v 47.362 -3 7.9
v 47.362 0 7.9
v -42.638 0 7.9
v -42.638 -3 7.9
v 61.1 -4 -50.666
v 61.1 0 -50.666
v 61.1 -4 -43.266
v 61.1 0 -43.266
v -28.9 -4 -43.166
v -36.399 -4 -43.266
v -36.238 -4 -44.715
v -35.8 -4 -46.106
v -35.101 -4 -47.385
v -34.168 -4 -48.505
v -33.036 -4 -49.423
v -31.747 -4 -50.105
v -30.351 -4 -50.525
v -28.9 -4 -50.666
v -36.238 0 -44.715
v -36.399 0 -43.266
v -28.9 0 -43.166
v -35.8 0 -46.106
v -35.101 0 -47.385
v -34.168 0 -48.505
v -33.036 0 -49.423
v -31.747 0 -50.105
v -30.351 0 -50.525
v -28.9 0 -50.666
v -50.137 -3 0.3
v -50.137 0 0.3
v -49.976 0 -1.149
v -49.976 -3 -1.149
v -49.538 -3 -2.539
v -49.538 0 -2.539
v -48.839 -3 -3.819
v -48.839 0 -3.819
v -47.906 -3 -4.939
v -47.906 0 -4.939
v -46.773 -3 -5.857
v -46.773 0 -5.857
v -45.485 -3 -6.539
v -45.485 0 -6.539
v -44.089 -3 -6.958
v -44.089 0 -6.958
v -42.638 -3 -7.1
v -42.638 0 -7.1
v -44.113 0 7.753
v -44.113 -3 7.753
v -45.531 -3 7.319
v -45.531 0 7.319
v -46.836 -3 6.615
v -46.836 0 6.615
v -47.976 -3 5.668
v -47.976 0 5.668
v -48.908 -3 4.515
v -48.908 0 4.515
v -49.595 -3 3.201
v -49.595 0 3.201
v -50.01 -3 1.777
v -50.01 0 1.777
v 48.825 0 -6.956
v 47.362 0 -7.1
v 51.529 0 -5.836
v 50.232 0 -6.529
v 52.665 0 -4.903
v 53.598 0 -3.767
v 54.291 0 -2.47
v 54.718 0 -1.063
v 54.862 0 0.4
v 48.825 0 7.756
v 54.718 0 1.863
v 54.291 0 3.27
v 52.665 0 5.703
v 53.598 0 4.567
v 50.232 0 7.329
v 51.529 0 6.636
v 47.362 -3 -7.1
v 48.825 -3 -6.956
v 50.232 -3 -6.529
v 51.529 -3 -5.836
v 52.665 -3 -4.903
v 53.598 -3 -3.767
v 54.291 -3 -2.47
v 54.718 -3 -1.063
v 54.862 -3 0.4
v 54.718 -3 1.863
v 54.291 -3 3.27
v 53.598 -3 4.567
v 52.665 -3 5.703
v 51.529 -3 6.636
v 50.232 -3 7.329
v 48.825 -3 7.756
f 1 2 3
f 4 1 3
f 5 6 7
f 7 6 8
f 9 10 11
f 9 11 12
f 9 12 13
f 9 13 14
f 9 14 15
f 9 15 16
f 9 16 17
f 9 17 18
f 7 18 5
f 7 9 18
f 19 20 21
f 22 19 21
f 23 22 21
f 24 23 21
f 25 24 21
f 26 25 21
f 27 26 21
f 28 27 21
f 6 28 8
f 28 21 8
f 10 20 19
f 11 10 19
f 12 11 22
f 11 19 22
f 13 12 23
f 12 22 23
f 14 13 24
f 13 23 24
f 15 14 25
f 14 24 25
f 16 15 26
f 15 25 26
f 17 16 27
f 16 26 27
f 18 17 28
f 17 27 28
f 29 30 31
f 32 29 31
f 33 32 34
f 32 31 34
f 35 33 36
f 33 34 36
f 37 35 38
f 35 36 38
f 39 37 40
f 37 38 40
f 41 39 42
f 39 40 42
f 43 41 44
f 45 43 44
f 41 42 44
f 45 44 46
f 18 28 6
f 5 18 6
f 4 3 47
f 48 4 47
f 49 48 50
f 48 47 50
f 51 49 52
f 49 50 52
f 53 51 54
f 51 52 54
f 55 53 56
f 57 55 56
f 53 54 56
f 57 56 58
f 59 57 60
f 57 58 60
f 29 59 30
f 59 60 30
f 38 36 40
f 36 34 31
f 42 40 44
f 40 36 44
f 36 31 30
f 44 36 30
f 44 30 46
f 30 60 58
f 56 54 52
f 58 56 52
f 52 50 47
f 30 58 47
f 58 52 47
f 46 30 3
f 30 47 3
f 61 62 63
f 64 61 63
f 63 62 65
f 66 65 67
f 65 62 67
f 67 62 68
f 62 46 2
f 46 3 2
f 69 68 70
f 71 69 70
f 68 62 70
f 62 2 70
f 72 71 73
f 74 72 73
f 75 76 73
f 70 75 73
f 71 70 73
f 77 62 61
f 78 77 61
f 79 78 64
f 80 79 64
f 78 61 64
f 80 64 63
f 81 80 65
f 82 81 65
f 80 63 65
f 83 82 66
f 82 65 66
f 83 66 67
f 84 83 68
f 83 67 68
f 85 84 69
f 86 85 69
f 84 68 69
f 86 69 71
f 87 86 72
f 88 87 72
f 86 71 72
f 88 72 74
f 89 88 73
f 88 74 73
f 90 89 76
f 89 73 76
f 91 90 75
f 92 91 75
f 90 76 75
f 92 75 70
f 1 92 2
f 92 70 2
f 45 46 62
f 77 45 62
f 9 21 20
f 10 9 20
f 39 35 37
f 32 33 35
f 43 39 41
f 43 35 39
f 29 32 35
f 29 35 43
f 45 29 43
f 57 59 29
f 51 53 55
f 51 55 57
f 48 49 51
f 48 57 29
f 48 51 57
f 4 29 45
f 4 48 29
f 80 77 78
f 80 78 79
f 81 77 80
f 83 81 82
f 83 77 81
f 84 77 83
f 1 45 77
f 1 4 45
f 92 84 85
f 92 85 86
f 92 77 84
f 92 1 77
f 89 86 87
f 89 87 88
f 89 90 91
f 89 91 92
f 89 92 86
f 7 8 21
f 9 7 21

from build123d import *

# Parameters (mm, degrees)
F1_DEPTH = 4
F2_DEPTH = 3


with BuildPart() as f1:
    # F0 (on Front) → F1 (new body)
    with BuildSketch(Plane.XZ):
        Polygon((-28.899978, -43.166491), (-28.899978, -50.666491), (61.100022, -50.666491), (61.100022, -43.266491), align=None)
        with BuildLine():
            ThreePointArc((-36.399311, -43.266491), (-34.167805, -48.505031), (-28.899978, -50.666491))
            Line((-28.899978, -50.666491), (-28.899978, -43.166491))
            Line((-28.899978, -43.166491), (-36.399311, -43.266491))
        make_face()
    extrude(amount=F1_DEPTH)


with BuildPart() as f2:
    # F0 (on Front) → F2 (new body)
    with BuildSketch(Plane.XZ):
        with BuildLine():
            ThreePointArc((-50.137134, 0.3), (-47.905628, -4.938539), (-42.637801, -7.1))
            Line((-42.637801, -7.1), (-42.637801, 0.3))
            Line((-42.637801, 0.3), (-50.137134, 0.3))
        make_face()
        with BuildLine():
            Line((-50.137134, 0.3), (-42.637801, 0.3))
            Line((-42.637801, 0.3), (-42.637801, 7.9))
            ThreePointArc((-42.637801, 7.9), (-47.97634, 5.667827), (-50.137134, 0.3))
        make_face()
        with BuildLine():
            Line((47.362199, -1.1), (47.362199, -7.1))
            ThreePointArc((47.362199, -7.1), (54.862199, 0.4), (47.362199, 7.9))
            Line((47.362199, 7.9), (47.362199, 1.9))
            ThreePointArc((47.362199, 1.9), (48.422859, 1.46066), (48.862199, 0.4))
            ThreePointArc((48.862199, 0.4), (48.422859, -0.66066), (47.362199, -1.1))
        make_face()
        with BuildLine():
            Line((-42.637801, 0.3), (-42.637801, -7.1))
            Line((-42.637801, -7.1), (47.362199, -7.1))
            Line((47.362199, -7.1), (47.362199, -1.1))
            ThreePointArc((47.362199, -1.1), (46.337504, -0.695445), (45.865536, 0.3))
            Line((45.865536, 0.3), (-31.948796, 0.3))
            Line((-31.948796, 0.3), (-42.637801, 0.3))
        make_face()
        with BuildLine():
            Line((-42.637801, 7.9), (-42.637801, 0.3))
            Line((-42.637801, 0.3), (-31.948796, 0.3))
            Line((-31.948796, 0.3), (45.865536, 0.3))
            ThreePointArc((45.865536, 0.3), (46.266754, 1.424695), (47.362199, 1.9))
            Line((47.362199, 1.9), (47.362199, 7.9))
            Line((47.362199, 7.9), (-42.637801, 7.9))
        make_face()
        with BuildLine():
            ThreePointArc((45.865536, 0.3), (46.337504, -0.695445), (47.362199, -1.1))
            ThreePointArc((47.362199, -1.1), (48.422859, -0.66066), (48.862199, 0.4))
            ThreePointArc((48.862199, 0.4), (48.422859, 1.46066), (47.362199, 1.9))
            ThreePointArc((47.362199, 1.9), (46.266754, 1.424695), (45.865536, 0.3))
        make_face()
    extrude(amount=F2_DEPTH)


solid = Compound([f1.part, f2.part])
